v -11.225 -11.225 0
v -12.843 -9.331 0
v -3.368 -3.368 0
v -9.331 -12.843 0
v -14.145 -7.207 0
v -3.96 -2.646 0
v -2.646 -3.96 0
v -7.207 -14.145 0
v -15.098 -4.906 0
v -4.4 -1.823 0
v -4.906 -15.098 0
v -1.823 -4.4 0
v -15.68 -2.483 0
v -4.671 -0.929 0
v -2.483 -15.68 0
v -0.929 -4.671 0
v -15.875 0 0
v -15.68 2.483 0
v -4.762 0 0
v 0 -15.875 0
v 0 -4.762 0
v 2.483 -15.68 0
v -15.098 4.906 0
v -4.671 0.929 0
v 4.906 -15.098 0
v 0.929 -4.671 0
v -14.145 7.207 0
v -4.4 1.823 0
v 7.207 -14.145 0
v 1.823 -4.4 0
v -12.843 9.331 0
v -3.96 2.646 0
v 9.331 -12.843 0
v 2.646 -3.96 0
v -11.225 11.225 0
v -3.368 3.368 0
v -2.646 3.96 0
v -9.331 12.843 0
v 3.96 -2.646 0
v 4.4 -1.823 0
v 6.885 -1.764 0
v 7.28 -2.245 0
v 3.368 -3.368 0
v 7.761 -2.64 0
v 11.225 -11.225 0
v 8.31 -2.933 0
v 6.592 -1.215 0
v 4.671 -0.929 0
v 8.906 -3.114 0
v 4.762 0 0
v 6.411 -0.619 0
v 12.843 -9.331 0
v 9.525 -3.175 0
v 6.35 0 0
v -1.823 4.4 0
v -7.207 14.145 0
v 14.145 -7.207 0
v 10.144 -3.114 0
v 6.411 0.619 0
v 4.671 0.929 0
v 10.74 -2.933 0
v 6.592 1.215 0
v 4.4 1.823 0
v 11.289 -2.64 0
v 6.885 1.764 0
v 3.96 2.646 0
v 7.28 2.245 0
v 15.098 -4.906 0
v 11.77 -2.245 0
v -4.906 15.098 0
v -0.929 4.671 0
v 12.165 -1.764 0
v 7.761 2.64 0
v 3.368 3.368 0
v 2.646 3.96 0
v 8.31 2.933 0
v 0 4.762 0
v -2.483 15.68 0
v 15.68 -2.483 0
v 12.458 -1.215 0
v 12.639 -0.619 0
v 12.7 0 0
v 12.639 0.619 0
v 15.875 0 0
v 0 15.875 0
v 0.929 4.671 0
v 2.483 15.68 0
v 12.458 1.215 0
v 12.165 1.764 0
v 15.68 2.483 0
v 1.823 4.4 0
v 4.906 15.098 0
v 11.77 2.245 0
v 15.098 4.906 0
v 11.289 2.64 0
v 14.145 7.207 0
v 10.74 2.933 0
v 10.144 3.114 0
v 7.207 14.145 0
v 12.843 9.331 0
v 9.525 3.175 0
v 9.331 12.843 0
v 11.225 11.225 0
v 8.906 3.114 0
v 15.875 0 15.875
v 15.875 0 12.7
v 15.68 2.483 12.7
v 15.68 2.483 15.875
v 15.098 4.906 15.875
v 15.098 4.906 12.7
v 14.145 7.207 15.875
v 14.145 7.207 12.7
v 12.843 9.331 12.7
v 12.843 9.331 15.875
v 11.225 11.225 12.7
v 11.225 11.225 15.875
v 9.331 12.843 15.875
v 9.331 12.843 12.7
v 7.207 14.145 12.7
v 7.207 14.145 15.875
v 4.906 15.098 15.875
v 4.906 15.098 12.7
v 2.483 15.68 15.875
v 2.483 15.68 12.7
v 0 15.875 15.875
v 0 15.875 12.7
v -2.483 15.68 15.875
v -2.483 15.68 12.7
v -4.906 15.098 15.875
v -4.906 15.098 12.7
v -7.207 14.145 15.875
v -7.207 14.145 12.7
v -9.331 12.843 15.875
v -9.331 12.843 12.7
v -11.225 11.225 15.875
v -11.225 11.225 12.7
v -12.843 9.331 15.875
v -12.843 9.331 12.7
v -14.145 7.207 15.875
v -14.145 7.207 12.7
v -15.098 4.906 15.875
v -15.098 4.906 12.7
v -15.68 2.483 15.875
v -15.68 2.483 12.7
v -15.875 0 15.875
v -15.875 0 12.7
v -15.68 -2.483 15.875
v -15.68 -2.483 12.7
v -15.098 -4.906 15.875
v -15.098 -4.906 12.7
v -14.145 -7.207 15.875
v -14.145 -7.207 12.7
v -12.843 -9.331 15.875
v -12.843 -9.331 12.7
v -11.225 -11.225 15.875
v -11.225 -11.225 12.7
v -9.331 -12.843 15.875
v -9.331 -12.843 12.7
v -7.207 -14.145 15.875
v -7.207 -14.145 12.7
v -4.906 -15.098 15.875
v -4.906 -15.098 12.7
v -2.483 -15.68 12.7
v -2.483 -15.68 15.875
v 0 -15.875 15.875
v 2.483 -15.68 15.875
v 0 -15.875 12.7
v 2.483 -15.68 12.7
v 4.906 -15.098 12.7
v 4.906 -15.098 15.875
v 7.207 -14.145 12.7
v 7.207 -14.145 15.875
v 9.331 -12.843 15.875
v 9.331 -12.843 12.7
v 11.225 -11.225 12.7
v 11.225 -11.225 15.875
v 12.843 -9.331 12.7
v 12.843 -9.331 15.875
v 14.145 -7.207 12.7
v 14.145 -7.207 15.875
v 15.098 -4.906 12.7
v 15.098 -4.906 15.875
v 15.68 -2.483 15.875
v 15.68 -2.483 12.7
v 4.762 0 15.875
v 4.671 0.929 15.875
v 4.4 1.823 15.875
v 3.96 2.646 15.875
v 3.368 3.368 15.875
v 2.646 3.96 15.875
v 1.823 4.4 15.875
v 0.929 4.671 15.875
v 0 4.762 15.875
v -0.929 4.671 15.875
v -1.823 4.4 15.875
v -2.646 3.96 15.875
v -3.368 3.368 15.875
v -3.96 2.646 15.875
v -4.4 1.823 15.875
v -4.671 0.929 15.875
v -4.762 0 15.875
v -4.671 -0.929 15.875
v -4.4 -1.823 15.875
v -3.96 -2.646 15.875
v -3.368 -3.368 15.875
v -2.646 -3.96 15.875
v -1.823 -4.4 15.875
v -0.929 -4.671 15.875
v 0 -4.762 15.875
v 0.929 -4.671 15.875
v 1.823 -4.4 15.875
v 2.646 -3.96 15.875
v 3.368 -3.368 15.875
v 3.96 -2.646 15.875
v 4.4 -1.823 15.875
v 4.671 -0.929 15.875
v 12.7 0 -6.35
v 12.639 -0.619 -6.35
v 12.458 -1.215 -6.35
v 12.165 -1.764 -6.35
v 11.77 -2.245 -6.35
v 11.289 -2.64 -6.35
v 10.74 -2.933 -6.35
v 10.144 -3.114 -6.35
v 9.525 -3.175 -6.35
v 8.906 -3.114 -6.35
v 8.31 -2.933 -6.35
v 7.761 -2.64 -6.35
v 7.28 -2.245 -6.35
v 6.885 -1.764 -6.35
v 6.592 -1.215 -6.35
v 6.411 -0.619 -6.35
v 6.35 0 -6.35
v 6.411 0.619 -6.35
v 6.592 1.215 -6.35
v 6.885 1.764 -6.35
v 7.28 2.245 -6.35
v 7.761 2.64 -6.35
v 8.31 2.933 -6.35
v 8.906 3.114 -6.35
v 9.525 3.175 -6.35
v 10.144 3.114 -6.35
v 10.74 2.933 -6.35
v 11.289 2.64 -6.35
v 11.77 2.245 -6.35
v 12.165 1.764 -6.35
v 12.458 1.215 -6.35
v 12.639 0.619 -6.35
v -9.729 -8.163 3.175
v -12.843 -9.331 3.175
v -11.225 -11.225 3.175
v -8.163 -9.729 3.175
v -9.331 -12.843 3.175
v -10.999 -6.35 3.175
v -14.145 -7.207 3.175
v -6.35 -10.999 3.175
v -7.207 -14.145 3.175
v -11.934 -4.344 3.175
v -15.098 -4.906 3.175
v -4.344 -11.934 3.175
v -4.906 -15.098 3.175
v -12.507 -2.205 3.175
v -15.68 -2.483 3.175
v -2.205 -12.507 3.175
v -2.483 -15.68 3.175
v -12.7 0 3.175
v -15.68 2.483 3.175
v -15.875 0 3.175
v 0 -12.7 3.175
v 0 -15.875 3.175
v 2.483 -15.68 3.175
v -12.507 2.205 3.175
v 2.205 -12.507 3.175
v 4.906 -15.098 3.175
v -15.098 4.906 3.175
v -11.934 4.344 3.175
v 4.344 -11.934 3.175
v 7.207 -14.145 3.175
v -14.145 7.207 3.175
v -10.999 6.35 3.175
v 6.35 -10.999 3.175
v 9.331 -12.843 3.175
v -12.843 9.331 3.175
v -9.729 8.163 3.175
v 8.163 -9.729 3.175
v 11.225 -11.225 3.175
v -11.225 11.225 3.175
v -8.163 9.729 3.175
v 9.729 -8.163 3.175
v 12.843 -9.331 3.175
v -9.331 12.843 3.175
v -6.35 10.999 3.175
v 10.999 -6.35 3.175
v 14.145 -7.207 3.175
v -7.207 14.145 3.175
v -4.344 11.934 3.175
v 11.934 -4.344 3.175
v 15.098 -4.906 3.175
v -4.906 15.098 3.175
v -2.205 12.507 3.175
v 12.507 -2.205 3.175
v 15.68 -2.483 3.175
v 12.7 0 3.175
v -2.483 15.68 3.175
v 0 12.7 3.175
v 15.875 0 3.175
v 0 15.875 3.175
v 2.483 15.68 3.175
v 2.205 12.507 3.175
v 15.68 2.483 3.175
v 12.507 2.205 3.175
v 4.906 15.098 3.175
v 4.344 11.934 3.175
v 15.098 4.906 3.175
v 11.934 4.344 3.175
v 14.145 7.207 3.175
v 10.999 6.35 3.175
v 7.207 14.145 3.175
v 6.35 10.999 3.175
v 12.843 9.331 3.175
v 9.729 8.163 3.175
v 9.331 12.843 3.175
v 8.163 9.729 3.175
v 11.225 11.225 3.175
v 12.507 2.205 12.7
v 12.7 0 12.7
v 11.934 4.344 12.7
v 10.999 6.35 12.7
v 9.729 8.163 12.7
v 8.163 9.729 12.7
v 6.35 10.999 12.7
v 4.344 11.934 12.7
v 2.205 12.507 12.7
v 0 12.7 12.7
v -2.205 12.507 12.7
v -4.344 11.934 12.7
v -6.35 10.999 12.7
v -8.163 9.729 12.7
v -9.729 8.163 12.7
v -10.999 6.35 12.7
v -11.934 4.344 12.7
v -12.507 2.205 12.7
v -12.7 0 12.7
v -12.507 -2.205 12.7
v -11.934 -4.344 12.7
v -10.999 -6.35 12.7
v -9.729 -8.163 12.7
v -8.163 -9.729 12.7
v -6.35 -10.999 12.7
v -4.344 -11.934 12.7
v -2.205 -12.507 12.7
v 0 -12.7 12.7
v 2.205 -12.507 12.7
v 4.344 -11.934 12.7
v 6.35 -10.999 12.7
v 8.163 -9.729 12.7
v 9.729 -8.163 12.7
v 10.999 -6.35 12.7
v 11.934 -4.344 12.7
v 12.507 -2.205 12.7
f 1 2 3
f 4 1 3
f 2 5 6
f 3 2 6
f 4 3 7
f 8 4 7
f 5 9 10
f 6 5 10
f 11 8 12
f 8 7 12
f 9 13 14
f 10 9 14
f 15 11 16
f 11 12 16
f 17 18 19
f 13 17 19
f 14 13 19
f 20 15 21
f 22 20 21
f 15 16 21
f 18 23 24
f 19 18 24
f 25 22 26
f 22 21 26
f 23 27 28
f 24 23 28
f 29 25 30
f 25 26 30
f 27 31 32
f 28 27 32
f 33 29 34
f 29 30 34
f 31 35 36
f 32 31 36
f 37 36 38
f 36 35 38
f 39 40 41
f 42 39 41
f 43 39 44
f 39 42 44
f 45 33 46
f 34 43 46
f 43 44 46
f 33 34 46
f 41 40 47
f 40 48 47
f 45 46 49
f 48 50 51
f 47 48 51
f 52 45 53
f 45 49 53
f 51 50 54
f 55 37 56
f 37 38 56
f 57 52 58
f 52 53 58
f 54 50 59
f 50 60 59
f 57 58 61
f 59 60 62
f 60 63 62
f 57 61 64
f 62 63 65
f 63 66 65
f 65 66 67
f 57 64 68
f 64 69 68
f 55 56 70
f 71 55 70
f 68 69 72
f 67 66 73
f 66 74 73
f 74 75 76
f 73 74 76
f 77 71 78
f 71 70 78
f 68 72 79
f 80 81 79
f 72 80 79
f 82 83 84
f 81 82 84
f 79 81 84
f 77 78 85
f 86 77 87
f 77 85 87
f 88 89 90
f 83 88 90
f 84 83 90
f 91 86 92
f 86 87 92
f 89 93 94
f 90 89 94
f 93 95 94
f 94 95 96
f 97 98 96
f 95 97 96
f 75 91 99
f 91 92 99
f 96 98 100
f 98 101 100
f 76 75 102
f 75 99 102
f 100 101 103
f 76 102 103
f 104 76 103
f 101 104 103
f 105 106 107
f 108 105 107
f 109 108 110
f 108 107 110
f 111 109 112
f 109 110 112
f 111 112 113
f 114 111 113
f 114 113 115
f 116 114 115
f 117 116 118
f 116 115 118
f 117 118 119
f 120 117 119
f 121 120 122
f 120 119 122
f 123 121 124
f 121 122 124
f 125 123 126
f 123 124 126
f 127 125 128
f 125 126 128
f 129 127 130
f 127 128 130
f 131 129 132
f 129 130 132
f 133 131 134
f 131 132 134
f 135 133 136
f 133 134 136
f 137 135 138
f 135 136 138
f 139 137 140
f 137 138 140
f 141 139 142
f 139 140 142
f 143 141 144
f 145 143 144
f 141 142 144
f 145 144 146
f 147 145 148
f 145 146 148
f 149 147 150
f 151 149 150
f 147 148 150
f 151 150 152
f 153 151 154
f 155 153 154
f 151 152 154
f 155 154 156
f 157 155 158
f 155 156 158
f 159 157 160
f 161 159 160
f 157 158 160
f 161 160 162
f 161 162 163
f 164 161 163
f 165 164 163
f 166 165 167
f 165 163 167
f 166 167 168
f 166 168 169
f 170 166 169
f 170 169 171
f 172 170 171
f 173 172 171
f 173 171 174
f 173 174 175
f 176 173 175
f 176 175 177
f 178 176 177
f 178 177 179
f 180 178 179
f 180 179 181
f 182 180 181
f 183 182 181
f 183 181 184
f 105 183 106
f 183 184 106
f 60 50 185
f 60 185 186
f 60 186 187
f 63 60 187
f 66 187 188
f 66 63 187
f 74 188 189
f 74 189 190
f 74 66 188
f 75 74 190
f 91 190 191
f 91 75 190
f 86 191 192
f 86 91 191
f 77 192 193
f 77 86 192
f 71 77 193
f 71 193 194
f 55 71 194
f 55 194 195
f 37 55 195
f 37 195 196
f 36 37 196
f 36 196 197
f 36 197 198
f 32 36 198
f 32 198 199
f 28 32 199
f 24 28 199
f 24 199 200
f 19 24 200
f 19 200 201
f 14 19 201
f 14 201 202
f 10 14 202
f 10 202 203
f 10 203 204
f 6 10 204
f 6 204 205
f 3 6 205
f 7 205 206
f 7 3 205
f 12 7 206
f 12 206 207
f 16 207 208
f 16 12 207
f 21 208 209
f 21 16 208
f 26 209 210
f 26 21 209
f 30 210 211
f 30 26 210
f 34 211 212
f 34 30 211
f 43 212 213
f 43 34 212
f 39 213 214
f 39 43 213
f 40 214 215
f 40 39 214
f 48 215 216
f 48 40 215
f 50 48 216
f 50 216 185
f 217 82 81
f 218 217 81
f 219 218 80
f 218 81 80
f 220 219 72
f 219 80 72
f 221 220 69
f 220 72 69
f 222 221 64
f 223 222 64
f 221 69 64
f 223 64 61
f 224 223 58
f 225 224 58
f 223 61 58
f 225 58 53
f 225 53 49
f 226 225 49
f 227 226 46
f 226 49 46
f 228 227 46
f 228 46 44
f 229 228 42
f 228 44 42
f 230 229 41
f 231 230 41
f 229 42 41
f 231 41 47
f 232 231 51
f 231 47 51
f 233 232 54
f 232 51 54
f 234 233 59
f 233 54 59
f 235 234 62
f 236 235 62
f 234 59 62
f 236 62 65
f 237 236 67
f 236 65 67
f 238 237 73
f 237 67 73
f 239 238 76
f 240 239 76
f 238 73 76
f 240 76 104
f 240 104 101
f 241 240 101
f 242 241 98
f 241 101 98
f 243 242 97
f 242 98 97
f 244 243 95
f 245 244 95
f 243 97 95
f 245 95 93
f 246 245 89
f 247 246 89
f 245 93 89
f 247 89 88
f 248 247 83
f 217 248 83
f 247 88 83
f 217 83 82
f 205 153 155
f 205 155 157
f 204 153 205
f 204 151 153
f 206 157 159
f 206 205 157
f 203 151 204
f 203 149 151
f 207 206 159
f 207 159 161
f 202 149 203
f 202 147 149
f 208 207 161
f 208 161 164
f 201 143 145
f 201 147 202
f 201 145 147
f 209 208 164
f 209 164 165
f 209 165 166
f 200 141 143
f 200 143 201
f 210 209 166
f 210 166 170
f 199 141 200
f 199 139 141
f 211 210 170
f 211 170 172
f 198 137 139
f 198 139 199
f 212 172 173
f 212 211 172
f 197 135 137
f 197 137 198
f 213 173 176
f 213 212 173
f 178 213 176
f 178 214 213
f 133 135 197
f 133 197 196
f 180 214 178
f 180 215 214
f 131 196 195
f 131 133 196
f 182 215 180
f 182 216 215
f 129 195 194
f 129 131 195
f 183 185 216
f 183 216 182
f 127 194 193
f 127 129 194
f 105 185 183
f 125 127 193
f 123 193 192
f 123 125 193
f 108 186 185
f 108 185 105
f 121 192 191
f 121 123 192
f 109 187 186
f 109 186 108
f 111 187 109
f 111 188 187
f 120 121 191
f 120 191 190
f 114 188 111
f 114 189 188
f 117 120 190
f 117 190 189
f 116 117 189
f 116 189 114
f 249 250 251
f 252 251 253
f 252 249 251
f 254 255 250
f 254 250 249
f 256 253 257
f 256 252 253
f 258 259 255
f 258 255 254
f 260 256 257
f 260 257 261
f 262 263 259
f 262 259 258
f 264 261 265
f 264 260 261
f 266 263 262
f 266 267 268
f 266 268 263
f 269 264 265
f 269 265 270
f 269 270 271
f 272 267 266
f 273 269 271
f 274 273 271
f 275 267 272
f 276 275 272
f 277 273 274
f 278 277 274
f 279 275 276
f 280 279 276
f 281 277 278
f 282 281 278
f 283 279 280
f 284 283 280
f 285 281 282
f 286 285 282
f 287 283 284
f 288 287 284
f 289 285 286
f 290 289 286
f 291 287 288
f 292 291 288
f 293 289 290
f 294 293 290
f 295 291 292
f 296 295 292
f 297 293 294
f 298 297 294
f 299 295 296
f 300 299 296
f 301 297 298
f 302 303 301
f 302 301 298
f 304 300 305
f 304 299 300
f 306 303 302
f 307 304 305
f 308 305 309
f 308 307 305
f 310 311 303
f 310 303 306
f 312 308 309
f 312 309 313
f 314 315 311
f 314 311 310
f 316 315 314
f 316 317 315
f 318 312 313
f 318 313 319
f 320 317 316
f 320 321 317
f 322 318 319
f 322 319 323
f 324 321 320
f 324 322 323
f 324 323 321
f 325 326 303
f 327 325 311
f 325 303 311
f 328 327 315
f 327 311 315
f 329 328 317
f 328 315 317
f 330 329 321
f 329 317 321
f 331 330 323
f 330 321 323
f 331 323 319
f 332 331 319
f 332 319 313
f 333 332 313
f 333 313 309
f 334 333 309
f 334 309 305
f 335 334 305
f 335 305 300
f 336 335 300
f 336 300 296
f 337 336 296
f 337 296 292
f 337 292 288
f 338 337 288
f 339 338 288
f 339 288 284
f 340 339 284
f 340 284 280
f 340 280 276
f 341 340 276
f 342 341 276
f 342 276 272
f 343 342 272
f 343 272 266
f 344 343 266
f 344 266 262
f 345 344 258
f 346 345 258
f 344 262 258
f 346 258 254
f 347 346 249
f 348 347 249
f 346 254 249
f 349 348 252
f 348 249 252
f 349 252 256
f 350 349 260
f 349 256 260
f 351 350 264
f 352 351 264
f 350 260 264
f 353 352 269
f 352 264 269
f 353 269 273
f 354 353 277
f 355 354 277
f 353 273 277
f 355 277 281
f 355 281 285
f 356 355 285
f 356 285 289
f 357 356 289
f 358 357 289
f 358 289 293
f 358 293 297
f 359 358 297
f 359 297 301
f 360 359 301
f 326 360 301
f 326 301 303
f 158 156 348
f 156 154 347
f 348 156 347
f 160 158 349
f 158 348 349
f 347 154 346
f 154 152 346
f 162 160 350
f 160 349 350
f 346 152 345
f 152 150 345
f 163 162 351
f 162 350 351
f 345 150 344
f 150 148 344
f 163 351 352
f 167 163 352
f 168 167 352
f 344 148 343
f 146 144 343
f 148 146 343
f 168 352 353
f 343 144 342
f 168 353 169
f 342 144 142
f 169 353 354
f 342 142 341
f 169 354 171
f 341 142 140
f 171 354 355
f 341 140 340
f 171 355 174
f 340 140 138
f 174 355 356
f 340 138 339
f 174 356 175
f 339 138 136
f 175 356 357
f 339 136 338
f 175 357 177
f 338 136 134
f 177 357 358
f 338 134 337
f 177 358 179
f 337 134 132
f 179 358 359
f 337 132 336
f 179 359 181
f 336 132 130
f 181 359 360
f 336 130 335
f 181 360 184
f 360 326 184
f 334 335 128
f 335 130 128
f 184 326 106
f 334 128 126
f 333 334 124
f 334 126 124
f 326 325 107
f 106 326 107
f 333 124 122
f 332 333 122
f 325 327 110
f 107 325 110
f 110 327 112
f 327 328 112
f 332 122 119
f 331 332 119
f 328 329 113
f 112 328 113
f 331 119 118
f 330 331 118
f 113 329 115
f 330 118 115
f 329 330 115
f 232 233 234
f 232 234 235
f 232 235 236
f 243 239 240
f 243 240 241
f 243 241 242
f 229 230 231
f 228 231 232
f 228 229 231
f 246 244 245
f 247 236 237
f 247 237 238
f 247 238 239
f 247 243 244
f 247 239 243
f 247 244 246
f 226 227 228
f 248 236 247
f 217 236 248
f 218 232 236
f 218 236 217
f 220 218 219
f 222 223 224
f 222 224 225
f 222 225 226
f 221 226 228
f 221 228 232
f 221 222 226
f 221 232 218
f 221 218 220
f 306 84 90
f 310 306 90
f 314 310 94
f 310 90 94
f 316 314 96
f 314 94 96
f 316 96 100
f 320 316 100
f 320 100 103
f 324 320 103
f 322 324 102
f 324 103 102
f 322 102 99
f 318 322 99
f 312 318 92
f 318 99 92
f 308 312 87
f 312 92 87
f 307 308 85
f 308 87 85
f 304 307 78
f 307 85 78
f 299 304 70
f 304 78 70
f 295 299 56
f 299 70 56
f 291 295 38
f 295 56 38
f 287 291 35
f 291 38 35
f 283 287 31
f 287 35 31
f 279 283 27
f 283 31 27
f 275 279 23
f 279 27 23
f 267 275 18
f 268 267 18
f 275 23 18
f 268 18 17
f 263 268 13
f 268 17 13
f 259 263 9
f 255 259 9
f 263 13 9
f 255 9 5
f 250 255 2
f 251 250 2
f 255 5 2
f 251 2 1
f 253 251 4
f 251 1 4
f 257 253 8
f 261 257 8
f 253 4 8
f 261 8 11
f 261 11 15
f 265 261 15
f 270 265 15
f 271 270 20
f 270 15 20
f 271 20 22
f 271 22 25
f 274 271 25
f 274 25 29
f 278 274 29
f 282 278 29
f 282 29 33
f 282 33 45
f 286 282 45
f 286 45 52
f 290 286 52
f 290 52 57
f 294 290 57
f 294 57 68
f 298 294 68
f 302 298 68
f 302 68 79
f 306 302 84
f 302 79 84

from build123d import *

# Parameters (mm, degrees)
F0_R     = 12.7
F0_R_2   = 4.7625
F1_DEPTH = 12.7
F2_R     = 15.875
F2_R_2   = 4.7625
F3_DEPTH = 3.175
F4_R     = 15.875
F4_R_2   = 4.7625
F5_DEPTH = 3.175
F6_R     = 3.175
F7_DEPTH = 6.35


with BuildPart() as f1:
    # F0 (on Top) → F1 (new body)
    with BuildSketch(Plane.XY):
        Circle(F0_R)
        Circle(F0_R_2, mode=Mode.SUBTRACT)
    extrude(amount=F1_DEPTH)

    # F2 (on face) → F3 (join)
    with BuildSketch(Plane.XY.offset(12.7)):
        Circle(F2_R)
        Circle(F2_R_2, mode=Mode.SUBTRACT)
    extrude(amount=F3_DEPTH)

    # F4 (on Top) → F5 (join)
    with BuildSketch(Plane.XY):
        Circle(F4_R)
        Circle(F4_R_2, mode=Mode.SUBTRACT)
    extrude(amount=F5_DEPTH)

    # F6 (on face) → F7 (join)
    with BuildSketch(Plane(origin=(0, 0, 0), x_dir=(1, 0, 0), z_dir=(0, 0, -1))):
        with Locations((9.525, 0)):
            Circle(F6_R)
    extrude(amount=F7_DEPTH)


solid = f1.part
